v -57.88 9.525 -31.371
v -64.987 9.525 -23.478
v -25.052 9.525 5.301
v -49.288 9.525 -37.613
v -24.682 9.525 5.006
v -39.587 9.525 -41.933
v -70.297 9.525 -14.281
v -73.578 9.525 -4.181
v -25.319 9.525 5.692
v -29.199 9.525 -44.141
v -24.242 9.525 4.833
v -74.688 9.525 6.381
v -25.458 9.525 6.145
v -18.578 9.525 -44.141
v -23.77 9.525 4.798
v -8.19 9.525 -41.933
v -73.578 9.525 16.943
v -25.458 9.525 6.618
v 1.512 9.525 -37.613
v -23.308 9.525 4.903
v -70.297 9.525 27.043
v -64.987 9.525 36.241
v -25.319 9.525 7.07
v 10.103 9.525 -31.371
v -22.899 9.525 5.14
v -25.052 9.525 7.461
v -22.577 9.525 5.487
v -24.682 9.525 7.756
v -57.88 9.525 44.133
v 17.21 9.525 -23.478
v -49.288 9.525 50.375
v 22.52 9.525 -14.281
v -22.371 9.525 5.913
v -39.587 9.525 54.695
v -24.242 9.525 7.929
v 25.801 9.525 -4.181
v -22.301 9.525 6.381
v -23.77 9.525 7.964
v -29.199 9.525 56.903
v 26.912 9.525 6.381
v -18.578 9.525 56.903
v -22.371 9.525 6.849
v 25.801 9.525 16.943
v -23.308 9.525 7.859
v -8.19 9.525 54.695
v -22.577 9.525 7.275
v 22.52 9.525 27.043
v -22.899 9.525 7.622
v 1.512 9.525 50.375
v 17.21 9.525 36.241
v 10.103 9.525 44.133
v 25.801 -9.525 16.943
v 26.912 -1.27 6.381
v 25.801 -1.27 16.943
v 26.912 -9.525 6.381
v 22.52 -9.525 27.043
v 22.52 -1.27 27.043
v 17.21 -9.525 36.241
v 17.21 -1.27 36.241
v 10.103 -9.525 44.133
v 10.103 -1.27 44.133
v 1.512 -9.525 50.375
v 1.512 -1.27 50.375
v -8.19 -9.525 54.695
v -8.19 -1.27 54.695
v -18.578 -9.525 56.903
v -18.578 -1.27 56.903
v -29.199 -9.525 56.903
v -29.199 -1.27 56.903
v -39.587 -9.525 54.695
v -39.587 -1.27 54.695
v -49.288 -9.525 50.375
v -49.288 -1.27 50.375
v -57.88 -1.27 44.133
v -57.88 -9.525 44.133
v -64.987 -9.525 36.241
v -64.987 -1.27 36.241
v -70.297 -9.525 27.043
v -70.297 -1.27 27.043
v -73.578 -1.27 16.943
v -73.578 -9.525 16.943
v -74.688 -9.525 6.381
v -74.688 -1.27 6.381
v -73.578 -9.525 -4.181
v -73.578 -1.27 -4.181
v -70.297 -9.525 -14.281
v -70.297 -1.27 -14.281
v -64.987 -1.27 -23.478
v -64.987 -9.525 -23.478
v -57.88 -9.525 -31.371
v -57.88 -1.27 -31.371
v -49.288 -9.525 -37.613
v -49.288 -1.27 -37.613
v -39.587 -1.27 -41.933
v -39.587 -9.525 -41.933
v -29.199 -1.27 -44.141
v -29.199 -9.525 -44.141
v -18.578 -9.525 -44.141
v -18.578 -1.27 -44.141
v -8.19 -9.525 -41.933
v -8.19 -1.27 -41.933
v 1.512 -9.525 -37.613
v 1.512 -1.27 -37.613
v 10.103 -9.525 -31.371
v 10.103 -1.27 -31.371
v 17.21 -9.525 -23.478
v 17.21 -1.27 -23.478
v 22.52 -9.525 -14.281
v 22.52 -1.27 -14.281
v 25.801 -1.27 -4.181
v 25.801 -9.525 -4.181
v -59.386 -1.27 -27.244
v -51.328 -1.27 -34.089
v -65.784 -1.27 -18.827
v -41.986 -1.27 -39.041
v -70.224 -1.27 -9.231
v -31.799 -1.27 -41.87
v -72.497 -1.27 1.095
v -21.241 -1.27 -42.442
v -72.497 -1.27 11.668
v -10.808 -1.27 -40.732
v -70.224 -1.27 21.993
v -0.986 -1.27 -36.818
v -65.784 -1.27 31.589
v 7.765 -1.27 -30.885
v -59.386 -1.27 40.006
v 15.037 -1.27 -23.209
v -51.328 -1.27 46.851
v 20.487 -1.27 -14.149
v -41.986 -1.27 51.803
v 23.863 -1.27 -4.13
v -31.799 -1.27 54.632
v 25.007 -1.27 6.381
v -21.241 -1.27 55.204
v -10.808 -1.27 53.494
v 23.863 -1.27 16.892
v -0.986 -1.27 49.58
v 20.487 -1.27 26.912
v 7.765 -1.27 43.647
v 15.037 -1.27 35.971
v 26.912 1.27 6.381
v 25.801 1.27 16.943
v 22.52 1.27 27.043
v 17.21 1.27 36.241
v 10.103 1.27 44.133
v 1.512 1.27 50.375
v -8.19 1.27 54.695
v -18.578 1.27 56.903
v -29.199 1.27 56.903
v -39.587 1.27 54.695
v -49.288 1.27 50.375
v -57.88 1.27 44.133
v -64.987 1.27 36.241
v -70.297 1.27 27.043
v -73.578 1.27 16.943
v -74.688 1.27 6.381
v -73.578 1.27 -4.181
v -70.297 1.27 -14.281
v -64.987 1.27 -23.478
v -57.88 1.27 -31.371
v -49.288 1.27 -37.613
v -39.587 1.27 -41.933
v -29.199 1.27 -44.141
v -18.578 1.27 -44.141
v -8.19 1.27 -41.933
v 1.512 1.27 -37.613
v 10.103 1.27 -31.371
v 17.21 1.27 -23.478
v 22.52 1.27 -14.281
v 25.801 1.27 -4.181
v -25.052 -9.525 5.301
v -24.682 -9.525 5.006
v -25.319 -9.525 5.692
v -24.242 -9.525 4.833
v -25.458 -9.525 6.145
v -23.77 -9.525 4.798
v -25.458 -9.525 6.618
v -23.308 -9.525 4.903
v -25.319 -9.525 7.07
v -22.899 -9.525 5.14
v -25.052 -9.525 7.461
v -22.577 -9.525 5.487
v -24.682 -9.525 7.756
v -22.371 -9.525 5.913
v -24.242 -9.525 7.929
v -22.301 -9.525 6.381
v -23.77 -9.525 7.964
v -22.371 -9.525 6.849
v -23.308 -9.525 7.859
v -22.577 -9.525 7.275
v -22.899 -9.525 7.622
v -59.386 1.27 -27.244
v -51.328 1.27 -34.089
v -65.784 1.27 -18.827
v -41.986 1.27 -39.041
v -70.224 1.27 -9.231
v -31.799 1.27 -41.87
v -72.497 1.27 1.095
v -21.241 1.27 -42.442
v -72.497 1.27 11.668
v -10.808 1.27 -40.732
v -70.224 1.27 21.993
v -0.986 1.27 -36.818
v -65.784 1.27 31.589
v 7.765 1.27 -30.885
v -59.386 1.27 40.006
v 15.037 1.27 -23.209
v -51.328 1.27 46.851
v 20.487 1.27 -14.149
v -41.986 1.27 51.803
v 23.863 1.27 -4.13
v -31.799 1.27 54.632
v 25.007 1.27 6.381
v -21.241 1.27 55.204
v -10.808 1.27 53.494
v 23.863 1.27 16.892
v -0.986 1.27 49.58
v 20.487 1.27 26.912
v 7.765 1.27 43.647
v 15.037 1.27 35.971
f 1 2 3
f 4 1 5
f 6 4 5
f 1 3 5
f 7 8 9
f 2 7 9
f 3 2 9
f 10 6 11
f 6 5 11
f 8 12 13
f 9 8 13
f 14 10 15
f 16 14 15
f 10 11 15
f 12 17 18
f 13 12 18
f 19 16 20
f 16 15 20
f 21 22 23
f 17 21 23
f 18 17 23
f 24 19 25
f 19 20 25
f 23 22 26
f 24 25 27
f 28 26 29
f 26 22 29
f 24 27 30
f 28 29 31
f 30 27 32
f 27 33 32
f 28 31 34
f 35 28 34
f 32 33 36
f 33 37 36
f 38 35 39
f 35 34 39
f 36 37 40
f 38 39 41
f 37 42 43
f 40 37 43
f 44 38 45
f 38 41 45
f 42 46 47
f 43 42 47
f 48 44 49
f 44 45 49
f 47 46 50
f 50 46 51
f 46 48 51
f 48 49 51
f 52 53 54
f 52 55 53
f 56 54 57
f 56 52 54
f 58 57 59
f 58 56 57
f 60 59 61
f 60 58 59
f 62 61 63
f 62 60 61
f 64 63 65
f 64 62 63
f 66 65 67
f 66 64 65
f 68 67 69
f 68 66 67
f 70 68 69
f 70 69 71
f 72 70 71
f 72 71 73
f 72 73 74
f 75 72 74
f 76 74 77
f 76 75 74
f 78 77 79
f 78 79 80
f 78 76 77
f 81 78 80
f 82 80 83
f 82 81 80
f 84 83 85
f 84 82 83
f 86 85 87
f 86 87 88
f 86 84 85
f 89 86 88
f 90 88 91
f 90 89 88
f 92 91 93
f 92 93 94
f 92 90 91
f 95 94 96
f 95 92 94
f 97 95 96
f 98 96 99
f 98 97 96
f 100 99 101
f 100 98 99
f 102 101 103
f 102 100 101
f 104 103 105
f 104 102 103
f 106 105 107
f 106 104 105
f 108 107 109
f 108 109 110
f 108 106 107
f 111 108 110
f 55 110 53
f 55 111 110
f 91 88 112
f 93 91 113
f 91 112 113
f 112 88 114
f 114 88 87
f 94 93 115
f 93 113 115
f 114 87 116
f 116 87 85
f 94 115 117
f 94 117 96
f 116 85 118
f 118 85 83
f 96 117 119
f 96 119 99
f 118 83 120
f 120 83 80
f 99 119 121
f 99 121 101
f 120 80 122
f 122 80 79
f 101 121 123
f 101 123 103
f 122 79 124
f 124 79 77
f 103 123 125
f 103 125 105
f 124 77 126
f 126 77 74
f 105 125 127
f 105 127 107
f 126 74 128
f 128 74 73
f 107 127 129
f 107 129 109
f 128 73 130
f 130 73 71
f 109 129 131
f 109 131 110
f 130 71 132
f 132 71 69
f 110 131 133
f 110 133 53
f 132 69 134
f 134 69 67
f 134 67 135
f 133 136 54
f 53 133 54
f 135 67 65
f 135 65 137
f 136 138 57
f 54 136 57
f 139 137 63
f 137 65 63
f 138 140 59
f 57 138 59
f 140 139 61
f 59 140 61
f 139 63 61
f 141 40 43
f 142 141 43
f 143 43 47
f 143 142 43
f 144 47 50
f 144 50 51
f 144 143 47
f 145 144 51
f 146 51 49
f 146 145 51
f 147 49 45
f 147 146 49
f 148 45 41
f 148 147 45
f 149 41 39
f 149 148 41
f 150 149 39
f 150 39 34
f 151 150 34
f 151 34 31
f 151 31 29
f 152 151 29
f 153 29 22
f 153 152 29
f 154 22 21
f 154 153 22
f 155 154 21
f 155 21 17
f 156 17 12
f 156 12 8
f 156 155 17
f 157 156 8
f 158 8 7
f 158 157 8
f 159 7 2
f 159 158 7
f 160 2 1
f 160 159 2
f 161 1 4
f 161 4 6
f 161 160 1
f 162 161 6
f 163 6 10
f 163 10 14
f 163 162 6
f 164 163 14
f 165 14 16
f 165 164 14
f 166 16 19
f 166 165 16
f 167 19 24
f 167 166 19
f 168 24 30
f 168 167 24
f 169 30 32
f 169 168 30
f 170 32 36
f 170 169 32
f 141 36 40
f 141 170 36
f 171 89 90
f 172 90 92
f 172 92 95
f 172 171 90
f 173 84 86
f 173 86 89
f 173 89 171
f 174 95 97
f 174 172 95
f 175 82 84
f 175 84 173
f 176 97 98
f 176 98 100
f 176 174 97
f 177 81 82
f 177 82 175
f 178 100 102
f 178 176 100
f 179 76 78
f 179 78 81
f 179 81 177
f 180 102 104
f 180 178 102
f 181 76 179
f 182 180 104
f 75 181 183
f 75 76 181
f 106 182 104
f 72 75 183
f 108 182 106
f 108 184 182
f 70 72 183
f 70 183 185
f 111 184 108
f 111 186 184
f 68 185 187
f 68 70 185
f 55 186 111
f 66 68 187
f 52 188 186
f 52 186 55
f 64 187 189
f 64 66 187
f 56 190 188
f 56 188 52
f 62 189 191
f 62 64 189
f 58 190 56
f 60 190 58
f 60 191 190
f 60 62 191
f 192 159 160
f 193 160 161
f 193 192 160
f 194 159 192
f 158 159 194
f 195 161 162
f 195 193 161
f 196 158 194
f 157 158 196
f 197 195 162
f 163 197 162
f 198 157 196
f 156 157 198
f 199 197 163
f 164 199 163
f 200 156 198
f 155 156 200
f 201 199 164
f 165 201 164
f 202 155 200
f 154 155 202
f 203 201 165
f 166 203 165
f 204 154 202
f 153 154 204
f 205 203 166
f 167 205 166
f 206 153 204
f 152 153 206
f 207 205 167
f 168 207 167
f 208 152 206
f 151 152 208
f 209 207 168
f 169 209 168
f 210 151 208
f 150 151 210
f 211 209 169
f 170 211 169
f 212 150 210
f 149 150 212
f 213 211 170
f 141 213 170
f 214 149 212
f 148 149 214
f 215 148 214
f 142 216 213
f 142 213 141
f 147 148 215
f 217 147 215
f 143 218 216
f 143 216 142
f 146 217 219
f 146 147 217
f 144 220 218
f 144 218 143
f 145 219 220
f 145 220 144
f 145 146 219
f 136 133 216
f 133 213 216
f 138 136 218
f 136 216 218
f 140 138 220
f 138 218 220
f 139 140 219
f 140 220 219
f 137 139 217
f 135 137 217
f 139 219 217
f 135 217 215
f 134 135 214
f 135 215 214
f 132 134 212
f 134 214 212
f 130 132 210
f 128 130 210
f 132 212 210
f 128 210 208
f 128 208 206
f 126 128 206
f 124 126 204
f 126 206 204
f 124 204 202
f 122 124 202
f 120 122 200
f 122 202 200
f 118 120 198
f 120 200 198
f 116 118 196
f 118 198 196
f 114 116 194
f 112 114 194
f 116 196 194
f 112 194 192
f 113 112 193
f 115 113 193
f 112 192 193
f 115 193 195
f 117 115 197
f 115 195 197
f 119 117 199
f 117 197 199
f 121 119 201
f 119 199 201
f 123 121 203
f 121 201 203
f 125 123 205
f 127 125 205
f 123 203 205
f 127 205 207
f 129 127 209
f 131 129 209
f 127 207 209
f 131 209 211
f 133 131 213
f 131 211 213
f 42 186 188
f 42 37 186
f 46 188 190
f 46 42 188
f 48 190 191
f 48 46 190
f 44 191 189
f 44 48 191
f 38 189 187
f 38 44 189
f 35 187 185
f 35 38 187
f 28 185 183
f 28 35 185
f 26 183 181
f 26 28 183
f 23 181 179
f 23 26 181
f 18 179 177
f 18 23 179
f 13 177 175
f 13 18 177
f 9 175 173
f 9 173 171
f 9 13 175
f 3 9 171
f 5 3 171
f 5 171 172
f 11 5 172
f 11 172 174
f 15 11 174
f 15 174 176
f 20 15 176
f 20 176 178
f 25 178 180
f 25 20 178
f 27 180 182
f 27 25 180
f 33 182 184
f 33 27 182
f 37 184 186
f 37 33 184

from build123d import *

# Parameters (mm, degrees)
F0_R     = 48.895
F0_R_2   = 1.5875
F1_DEPTH = 9.525
F0_R_3   = 50.8
F2_DEPTH = 9.525
F3_DEPTH = 1.27


with BuildPart() as f1:
    # F0 (on Front) → F1 (new body, symmetric)
    with BuildSketch(Plane.XZ):
        with Locations((-23.888467, 6.381166)):
            Circle(F0_R)
        with Locations((-23.888467, 6.381166)):
            Circle(F0_R_2, mode=Mode.SUBTRACT)
    extrude(amount=F1_DEPTH, both=True)

    # F0 (on Front) → F2 (join, symmetric)
    with BuildSketch(Plane.XZ):
        with Locations((-23.888467, 6.381166)):
            Circle(F0_R_3)
        with Locations((-23.888467, 6.381166)):
            Circle(F0_R, mode=Mode.SUBTRACT)
    extrude(amount=F2_DEPTH, both=True)

    # F0 (on Front) → F3 (cut, symmetric)
    with BuildSketch(Plane.XZ):
        with Locations((-23.888467, 6.381166)):
            Circle(F0_R_3)
        with Locations((-23.888467, 6.381166)):
            Circle(F0_R, mode=Mode.SUBTRACT)
    extrude(amount=F3_DEPTH, both=True, mode=Mode.SUBTRACT)


solid = f1.part
